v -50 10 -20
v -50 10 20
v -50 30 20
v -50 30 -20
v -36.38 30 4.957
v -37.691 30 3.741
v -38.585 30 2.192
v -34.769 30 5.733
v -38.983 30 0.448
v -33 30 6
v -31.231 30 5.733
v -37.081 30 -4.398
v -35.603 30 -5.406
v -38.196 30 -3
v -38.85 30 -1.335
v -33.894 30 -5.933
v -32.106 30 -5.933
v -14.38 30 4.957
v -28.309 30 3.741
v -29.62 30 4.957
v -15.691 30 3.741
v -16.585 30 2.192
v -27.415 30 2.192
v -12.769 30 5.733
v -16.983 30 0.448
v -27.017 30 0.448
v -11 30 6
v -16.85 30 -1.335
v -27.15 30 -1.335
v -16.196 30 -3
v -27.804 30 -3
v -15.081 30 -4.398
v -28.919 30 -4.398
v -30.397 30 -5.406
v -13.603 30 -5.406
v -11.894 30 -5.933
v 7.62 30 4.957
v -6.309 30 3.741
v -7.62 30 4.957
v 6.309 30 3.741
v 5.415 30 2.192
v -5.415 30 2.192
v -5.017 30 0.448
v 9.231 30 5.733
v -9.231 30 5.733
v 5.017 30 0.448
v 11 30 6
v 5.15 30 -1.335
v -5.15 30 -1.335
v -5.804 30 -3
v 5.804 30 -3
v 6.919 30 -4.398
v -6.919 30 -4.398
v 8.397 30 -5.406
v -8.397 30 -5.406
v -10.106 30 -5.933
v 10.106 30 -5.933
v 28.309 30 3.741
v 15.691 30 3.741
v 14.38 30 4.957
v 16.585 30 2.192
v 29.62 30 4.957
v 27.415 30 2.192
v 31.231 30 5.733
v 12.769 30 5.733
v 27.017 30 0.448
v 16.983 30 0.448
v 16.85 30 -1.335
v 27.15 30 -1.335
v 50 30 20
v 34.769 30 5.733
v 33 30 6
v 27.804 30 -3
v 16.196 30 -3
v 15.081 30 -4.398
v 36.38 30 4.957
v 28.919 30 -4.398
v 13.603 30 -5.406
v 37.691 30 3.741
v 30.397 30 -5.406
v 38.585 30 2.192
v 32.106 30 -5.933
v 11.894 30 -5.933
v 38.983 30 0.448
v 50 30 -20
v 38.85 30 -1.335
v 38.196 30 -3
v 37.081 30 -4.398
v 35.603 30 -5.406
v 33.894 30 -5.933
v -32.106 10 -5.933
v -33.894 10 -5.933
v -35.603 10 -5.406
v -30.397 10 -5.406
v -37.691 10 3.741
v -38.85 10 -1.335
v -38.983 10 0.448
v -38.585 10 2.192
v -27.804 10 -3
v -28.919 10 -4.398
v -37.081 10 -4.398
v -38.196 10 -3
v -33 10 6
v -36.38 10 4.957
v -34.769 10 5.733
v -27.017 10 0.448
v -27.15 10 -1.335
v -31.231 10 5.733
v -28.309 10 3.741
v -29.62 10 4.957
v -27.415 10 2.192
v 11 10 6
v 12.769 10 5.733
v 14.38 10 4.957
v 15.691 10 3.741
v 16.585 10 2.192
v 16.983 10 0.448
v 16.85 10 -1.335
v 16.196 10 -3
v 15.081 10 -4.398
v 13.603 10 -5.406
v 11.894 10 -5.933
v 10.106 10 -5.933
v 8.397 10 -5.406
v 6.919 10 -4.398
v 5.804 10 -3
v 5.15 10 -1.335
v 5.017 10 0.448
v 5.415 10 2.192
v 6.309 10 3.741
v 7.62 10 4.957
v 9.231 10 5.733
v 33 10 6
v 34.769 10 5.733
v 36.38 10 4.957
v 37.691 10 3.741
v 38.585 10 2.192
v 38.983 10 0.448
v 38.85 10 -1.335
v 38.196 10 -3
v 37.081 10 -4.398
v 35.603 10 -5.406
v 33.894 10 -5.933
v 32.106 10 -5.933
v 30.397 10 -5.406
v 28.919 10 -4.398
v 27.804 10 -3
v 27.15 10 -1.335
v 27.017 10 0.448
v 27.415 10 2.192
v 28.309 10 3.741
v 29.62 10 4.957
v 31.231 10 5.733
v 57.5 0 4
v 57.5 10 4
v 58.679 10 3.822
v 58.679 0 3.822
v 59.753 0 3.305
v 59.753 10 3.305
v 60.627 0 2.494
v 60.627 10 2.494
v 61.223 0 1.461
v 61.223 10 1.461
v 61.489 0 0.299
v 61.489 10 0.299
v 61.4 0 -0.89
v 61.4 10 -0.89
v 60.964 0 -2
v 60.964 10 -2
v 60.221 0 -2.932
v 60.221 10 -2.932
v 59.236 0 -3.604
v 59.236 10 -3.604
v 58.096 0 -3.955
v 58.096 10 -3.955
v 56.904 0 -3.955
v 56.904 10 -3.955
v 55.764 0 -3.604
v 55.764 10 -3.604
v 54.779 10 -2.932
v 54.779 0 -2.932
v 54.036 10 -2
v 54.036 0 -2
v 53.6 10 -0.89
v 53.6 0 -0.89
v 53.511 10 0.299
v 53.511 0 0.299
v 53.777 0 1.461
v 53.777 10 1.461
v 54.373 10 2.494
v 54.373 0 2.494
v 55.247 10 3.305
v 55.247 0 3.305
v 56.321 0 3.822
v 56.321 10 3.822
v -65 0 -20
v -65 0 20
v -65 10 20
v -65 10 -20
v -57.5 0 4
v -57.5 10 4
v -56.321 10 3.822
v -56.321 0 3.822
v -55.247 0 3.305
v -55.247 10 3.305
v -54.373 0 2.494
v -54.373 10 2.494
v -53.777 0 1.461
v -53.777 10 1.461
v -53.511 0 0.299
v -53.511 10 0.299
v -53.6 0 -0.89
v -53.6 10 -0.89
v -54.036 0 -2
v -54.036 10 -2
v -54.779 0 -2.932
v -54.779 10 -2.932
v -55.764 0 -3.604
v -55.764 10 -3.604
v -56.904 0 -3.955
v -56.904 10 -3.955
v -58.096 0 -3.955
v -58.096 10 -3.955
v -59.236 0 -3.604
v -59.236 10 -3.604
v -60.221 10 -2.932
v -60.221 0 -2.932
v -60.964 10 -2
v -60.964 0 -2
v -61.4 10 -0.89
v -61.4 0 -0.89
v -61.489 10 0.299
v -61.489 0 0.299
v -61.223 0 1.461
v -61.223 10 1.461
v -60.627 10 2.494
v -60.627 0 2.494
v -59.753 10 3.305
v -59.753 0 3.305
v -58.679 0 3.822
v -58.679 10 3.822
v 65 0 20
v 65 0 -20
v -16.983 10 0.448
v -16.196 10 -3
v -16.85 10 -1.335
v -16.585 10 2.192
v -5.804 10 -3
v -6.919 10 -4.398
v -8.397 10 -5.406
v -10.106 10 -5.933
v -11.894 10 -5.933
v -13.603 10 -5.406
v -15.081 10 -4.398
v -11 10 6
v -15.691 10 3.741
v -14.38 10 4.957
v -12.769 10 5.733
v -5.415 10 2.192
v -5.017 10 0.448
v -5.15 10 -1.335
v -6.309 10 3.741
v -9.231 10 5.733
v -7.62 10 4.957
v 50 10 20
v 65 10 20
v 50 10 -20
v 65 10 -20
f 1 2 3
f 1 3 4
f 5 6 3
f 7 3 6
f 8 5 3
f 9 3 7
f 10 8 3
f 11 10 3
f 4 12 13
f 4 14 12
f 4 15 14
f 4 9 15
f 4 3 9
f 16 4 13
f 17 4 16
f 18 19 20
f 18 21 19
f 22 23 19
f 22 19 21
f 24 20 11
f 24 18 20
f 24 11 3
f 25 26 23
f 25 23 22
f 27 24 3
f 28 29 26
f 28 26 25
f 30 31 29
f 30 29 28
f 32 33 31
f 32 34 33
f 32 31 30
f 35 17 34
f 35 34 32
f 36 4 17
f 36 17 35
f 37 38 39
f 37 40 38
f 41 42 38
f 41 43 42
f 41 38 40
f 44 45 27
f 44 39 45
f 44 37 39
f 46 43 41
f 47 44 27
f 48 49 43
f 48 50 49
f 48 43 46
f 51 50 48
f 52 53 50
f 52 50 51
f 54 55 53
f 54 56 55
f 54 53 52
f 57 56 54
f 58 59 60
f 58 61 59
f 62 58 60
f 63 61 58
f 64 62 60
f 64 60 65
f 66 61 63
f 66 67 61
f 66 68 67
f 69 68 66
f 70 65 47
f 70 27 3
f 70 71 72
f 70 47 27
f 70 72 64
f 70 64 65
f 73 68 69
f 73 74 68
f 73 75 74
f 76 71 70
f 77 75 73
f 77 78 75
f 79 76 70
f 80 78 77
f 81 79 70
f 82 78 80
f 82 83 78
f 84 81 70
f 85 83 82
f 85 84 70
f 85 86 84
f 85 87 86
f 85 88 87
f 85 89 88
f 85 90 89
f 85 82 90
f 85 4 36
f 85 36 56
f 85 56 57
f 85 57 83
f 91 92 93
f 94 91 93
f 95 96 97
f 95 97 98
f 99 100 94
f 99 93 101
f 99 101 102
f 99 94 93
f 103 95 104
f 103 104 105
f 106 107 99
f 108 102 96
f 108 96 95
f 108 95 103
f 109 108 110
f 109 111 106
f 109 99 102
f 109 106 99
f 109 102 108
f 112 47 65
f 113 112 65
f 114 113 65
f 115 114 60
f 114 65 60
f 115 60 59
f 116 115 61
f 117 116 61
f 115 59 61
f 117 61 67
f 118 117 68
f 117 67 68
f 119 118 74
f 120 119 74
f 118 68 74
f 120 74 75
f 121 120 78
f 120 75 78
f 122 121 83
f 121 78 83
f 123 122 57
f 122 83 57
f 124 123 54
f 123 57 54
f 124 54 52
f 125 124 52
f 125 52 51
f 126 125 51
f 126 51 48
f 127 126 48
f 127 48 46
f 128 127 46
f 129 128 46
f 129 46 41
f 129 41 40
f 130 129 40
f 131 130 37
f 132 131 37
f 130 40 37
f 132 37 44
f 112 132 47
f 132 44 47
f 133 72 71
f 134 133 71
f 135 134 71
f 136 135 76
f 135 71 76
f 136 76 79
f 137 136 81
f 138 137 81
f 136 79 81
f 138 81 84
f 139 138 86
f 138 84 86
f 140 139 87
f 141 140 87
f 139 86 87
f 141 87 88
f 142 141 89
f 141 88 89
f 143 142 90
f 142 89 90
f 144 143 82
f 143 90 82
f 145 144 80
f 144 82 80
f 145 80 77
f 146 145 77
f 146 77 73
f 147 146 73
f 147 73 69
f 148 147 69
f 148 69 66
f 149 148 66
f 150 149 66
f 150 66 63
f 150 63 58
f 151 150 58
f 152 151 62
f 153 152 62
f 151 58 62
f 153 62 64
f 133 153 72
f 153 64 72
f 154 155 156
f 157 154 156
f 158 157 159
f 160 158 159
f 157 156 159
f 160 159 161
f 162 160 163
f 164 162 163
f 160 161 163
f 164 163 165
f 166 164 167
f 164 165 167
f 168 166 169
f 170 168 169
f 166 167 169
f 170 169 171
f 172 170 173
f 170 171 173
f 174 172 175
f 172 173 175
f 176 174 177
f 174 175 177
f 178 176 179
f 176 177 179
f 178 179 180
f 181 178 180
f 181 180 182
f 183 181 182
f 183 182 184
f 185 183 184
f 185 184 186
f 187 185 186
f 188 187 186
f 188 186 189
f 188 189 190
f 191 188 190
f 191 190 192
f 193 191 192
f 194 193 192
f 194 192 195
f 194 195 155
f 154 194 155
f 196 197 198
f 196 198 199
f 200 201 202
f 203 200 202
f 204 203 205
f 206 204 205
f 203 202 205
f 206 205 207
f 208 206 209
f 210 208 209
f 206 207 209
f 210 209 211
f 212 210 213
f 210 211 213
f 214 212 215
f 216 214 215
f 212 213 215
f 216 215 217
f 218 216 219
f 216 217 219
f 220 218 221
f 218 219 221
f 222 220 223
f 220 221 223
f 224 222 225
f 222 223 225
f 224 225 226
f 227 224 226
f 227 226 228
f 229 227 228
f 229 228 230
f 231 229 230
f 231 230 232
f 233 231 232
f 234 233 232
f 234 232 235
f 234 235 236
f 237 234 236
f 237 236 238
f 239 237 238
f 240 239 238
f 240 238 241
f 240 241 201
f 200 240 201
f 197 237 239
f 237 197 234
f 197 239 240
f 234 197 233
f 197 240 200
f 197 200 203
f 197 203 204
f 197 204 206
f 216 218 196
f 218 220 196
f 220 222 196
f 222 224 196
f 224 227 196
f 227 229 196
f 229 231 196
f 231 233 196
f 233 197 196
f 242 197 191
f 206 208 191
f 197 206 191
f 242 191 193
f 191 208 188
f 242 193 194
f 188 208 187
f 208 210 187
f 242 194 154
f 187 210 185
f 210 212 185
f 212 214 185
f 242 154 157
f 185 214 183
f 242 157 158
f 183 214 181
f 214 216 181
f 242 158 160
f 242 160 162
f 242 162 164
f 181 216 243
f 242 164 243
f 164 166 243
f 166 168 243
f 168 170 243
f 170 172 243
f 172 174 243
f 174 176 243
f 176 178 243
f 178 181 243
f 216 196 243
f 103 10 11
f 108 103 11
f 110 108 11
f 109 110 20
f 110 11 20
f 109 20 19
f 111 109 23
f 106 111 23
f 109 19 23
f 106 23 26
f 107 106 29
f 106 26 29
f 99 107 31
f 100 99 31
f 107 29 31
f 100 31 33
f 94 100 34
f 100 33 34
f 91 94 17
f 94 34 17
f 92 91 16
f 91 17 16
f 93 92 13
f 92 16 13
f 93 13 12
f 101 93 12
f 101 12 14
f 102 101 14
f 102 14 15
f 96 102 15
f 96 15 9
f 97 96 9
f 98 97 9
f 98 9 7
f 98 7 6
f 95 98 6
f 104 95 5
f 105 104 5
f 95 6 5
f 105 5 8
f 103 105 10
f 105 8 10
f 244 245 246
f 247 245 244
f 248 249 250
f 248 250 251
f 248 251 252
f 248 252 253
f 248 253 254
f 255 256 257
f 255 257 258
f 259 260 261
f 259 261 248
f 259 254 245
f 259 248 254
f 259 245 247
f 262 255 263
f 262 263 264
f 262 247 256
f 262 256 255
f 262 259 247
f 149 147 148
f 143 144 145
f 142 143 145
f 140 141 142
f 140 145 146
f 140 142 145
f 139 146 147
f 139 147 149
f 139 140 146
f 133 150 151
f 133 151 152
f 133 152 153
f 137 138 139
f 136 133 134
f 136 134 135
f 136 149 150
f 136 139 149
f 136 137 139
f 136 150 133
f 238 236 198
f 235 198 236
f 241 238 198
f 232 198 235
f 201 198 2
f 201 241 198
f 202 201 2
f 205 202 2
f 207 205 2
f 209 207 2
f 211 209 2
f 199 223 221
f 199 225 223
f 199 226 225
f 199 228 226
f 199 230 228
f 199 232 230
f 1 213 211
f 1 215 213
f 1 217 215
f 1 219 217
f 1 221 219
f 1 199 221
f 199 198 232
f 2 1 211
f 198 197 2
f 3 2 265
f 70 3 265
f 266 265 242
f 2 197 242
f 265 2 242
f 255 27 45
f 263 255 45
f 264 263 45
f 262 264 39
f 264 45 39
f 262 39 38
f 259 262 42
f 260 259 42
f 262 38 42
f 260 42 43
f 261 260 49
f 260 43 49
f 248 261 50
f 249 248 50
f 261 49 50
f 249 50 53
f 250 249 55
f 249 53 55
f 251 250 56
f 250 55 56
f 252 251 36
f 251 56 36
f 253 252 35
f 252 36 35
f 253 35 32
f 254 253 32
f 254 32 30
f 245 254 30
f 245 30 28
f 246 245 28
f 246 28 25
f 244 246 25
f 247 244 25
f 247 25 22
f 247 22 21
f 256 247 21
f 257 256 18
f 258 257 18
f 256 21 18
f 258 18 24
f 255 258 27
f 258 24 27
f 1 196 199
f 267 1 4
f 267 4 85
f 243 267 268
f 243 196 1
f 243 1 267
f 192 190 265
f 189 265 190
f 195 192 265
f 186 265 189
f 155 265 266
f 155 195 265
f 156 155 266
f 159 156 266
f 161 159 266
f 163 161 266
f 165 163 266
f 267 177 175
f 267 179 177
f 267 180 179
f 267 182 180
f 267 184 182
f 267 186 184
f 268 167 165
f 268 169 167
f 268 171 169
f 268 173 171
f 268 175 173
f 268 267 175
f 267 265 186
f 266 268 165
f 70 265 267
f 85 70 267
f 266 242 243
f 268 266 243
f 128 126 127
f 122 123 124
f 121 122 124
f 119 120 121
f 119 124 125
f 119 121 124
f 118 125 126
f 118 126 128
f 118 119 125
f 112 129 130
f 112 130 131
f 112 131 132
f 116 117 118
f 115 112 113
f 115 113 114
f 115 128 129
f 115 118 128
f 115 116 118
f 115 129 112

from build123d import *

# Parameters (mm, degrees)
SKETCH_1_W          = 130
SKETCH_1_H          = 40
EXTRUDE_1_DEPTH     = 10
SKETCH_2_W          = 100
SKETCH_2_H          = 40
EXTRUDE_2_DEPTH     = 20
SKETCH_3_R          = 6
CUT_EXTRUDE_1_DEPTH = 20
SKETCH_4_R          = 4
CUT_EXTRUDE_2_DEPTH = 75.330343737


with BuildPart() as part:
    # 草图1 → 凸台-拉伸1 (new body)
    with BuildSketch(Plane(origin=(0, 0, 0), x_dir=(1, 0, 0), z_dir=(0, 1, 0))):
        Rectangle(SKETCH_1_W, SKETCH_1_H)
    extrude(amount=EXTRUDE_1_DEPTH)

    # 草图2 → 凸台-拉伸2 (add)
    with BuildSketch(Plane(origin=(0, 10, 0), x_dir=(1, 0, 0), z_dir=(0, 1, 0))):
        Rectangle(SKETCH_2_W, SKETCH_2_H)
    extrude(amount=EXTRUDE_2_DEPTH)

    # 草图3 → 切除-拉伸1 (cut)
    with BuildSketch(Plane(origin=(0, 30, 0), x_dir=(1, 0, 0), z_dir=(0, 1, 0))):
        with Locations(Location((-33, 0, 0), (0, 0, 270))):
            Circle(SKETCH_3_R)
        with Locations(Location((-11, 0, 0), (0, 0, 270))):
            Circle(SKETCH_3_R)
        with Locations(Location((11, 0, 0), (0, 0, 270))):
            Circle(SKETCH_3_R)
        with Locations(Location((33, 0, 0), (0, 0, 270))):
            Circle(SKETCH_3_R)
    extrude(amount=-CUT_EXTRUDE_1_DEPTH, mode=Mode.SUBTRACT)

    # 草图4 → 切除-拉伸2 (cut, through all)
    with BuildSketch(Plane(origin=(0, 30, 0), x_dir=(1, 0, 0), z_dir=(0, 1, 0))):
        with Locations(Location((-57.5, 0, 0), (0, 0, 270))):
            Circle(SKETCH_4_R)
        with Locations(Location((57.5, 0, 0), (0, 0, 270))):
            Circle(SKETCH_4_R)
    extrude(amount=-CUT_EXTRUDE_2_DEPTH, mode=Mode.SUBTRACT)


solid = part.part
